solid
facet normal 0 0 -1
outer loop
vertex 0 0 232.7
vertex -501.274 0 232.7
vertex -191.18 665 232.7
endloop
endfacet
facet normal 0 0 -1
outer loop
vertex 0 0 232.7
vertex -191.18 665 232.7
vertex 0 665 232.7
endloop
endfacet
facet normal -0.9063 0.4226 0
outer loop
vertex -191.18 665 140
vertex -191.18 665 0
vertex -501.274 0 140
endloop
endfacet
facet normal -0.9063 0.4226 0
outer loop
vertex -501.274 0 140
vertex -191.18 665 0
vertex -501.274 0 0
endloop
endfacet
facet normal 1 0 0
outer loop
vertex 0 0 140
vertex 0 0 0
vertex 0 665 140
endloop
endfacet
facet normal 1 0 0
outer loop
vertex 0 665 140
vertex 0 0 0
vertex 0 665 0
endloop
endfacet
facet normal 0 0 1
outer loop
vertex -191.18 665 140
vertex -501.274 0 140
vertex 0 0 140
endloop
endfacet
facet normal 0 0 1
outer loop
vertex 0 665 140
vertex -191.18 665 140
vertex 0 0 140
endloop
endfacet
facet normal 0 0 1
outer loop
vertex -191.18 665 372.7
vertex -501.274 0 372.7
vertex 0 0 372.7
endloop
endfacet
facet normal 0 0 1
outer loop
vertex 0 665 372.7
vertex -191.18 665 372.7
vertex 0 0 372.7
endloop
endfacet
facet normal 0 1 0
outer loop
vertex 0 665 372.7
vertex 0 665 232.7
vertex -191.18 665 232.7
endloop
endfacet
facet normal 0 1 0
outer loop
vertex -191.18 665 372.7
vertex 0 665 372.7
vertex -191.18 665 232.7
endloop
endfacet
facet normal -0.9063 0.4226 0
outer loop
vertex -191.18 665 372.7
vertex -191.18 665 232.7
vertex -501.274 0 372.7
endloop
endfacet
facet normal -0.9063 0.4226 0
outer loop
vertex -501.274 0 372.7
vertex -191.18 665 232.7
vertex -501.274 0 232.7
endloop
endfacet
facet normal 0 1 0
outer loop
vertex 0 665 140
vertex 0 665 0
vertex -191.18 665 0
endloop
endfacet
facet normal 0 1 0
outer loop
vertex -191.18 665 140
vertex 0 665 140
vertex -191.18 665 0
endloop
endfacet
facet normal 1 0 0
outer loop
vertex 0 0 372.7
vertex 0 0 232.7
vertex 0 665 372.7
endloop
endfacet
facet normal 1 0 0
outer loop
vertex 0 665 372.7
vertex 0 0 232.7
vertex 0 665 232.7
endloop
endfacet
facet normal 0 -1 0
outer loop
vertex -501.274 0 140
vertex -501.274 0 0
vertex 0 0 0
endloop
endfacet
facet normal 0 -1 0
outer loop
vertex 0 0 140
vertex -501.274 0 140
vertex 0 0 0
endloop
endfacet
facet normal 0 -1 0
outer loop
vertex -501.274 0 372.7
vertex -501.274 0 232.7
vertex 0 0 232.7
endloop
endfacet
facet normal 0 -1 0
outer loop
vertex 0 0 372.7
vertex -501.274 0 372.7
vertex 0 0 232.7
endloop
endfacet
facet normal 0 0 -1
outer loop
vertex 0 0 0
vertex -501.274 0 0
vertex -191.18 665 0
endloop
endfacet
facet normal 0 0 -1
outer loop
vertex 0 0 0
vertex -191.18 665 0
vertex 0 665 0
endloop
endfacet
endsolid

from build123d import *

# Parameters (mm, degrees)
EXTRUDE_1_DEPTH        = 140
PATTERN_LINEAR_1_COUNT = 2
PATTERN_LINEAR_1_PITCH = 232.7


with BuildPart() as part:
    # 草图1 → 凸台-拉伸1 (new body)
    with BuildSketch(Plane.XY):
        Polygon((-150, 635), (-446.105362928, 0), (0, 0), (0, 635), align=None)
        Polygon((-150, 635), (0, 635), (0, 665), (-191.179666203, 665), (-501.274258877, 0), (-446.105362928, 0), align=None)
    extrude(amount=EXTRUDE_1_DEPTH)


with BuildPart() as pattern_linear_1_1:
    # 阵列(线性)1: pattern copy
    add(part.part.moved(Location(Vector(0, 0, 1) * (1 * PATTERN_LINEAR_1_PITCH))))


solid = Compound([part.part, pattern_linear_1_1.part])
